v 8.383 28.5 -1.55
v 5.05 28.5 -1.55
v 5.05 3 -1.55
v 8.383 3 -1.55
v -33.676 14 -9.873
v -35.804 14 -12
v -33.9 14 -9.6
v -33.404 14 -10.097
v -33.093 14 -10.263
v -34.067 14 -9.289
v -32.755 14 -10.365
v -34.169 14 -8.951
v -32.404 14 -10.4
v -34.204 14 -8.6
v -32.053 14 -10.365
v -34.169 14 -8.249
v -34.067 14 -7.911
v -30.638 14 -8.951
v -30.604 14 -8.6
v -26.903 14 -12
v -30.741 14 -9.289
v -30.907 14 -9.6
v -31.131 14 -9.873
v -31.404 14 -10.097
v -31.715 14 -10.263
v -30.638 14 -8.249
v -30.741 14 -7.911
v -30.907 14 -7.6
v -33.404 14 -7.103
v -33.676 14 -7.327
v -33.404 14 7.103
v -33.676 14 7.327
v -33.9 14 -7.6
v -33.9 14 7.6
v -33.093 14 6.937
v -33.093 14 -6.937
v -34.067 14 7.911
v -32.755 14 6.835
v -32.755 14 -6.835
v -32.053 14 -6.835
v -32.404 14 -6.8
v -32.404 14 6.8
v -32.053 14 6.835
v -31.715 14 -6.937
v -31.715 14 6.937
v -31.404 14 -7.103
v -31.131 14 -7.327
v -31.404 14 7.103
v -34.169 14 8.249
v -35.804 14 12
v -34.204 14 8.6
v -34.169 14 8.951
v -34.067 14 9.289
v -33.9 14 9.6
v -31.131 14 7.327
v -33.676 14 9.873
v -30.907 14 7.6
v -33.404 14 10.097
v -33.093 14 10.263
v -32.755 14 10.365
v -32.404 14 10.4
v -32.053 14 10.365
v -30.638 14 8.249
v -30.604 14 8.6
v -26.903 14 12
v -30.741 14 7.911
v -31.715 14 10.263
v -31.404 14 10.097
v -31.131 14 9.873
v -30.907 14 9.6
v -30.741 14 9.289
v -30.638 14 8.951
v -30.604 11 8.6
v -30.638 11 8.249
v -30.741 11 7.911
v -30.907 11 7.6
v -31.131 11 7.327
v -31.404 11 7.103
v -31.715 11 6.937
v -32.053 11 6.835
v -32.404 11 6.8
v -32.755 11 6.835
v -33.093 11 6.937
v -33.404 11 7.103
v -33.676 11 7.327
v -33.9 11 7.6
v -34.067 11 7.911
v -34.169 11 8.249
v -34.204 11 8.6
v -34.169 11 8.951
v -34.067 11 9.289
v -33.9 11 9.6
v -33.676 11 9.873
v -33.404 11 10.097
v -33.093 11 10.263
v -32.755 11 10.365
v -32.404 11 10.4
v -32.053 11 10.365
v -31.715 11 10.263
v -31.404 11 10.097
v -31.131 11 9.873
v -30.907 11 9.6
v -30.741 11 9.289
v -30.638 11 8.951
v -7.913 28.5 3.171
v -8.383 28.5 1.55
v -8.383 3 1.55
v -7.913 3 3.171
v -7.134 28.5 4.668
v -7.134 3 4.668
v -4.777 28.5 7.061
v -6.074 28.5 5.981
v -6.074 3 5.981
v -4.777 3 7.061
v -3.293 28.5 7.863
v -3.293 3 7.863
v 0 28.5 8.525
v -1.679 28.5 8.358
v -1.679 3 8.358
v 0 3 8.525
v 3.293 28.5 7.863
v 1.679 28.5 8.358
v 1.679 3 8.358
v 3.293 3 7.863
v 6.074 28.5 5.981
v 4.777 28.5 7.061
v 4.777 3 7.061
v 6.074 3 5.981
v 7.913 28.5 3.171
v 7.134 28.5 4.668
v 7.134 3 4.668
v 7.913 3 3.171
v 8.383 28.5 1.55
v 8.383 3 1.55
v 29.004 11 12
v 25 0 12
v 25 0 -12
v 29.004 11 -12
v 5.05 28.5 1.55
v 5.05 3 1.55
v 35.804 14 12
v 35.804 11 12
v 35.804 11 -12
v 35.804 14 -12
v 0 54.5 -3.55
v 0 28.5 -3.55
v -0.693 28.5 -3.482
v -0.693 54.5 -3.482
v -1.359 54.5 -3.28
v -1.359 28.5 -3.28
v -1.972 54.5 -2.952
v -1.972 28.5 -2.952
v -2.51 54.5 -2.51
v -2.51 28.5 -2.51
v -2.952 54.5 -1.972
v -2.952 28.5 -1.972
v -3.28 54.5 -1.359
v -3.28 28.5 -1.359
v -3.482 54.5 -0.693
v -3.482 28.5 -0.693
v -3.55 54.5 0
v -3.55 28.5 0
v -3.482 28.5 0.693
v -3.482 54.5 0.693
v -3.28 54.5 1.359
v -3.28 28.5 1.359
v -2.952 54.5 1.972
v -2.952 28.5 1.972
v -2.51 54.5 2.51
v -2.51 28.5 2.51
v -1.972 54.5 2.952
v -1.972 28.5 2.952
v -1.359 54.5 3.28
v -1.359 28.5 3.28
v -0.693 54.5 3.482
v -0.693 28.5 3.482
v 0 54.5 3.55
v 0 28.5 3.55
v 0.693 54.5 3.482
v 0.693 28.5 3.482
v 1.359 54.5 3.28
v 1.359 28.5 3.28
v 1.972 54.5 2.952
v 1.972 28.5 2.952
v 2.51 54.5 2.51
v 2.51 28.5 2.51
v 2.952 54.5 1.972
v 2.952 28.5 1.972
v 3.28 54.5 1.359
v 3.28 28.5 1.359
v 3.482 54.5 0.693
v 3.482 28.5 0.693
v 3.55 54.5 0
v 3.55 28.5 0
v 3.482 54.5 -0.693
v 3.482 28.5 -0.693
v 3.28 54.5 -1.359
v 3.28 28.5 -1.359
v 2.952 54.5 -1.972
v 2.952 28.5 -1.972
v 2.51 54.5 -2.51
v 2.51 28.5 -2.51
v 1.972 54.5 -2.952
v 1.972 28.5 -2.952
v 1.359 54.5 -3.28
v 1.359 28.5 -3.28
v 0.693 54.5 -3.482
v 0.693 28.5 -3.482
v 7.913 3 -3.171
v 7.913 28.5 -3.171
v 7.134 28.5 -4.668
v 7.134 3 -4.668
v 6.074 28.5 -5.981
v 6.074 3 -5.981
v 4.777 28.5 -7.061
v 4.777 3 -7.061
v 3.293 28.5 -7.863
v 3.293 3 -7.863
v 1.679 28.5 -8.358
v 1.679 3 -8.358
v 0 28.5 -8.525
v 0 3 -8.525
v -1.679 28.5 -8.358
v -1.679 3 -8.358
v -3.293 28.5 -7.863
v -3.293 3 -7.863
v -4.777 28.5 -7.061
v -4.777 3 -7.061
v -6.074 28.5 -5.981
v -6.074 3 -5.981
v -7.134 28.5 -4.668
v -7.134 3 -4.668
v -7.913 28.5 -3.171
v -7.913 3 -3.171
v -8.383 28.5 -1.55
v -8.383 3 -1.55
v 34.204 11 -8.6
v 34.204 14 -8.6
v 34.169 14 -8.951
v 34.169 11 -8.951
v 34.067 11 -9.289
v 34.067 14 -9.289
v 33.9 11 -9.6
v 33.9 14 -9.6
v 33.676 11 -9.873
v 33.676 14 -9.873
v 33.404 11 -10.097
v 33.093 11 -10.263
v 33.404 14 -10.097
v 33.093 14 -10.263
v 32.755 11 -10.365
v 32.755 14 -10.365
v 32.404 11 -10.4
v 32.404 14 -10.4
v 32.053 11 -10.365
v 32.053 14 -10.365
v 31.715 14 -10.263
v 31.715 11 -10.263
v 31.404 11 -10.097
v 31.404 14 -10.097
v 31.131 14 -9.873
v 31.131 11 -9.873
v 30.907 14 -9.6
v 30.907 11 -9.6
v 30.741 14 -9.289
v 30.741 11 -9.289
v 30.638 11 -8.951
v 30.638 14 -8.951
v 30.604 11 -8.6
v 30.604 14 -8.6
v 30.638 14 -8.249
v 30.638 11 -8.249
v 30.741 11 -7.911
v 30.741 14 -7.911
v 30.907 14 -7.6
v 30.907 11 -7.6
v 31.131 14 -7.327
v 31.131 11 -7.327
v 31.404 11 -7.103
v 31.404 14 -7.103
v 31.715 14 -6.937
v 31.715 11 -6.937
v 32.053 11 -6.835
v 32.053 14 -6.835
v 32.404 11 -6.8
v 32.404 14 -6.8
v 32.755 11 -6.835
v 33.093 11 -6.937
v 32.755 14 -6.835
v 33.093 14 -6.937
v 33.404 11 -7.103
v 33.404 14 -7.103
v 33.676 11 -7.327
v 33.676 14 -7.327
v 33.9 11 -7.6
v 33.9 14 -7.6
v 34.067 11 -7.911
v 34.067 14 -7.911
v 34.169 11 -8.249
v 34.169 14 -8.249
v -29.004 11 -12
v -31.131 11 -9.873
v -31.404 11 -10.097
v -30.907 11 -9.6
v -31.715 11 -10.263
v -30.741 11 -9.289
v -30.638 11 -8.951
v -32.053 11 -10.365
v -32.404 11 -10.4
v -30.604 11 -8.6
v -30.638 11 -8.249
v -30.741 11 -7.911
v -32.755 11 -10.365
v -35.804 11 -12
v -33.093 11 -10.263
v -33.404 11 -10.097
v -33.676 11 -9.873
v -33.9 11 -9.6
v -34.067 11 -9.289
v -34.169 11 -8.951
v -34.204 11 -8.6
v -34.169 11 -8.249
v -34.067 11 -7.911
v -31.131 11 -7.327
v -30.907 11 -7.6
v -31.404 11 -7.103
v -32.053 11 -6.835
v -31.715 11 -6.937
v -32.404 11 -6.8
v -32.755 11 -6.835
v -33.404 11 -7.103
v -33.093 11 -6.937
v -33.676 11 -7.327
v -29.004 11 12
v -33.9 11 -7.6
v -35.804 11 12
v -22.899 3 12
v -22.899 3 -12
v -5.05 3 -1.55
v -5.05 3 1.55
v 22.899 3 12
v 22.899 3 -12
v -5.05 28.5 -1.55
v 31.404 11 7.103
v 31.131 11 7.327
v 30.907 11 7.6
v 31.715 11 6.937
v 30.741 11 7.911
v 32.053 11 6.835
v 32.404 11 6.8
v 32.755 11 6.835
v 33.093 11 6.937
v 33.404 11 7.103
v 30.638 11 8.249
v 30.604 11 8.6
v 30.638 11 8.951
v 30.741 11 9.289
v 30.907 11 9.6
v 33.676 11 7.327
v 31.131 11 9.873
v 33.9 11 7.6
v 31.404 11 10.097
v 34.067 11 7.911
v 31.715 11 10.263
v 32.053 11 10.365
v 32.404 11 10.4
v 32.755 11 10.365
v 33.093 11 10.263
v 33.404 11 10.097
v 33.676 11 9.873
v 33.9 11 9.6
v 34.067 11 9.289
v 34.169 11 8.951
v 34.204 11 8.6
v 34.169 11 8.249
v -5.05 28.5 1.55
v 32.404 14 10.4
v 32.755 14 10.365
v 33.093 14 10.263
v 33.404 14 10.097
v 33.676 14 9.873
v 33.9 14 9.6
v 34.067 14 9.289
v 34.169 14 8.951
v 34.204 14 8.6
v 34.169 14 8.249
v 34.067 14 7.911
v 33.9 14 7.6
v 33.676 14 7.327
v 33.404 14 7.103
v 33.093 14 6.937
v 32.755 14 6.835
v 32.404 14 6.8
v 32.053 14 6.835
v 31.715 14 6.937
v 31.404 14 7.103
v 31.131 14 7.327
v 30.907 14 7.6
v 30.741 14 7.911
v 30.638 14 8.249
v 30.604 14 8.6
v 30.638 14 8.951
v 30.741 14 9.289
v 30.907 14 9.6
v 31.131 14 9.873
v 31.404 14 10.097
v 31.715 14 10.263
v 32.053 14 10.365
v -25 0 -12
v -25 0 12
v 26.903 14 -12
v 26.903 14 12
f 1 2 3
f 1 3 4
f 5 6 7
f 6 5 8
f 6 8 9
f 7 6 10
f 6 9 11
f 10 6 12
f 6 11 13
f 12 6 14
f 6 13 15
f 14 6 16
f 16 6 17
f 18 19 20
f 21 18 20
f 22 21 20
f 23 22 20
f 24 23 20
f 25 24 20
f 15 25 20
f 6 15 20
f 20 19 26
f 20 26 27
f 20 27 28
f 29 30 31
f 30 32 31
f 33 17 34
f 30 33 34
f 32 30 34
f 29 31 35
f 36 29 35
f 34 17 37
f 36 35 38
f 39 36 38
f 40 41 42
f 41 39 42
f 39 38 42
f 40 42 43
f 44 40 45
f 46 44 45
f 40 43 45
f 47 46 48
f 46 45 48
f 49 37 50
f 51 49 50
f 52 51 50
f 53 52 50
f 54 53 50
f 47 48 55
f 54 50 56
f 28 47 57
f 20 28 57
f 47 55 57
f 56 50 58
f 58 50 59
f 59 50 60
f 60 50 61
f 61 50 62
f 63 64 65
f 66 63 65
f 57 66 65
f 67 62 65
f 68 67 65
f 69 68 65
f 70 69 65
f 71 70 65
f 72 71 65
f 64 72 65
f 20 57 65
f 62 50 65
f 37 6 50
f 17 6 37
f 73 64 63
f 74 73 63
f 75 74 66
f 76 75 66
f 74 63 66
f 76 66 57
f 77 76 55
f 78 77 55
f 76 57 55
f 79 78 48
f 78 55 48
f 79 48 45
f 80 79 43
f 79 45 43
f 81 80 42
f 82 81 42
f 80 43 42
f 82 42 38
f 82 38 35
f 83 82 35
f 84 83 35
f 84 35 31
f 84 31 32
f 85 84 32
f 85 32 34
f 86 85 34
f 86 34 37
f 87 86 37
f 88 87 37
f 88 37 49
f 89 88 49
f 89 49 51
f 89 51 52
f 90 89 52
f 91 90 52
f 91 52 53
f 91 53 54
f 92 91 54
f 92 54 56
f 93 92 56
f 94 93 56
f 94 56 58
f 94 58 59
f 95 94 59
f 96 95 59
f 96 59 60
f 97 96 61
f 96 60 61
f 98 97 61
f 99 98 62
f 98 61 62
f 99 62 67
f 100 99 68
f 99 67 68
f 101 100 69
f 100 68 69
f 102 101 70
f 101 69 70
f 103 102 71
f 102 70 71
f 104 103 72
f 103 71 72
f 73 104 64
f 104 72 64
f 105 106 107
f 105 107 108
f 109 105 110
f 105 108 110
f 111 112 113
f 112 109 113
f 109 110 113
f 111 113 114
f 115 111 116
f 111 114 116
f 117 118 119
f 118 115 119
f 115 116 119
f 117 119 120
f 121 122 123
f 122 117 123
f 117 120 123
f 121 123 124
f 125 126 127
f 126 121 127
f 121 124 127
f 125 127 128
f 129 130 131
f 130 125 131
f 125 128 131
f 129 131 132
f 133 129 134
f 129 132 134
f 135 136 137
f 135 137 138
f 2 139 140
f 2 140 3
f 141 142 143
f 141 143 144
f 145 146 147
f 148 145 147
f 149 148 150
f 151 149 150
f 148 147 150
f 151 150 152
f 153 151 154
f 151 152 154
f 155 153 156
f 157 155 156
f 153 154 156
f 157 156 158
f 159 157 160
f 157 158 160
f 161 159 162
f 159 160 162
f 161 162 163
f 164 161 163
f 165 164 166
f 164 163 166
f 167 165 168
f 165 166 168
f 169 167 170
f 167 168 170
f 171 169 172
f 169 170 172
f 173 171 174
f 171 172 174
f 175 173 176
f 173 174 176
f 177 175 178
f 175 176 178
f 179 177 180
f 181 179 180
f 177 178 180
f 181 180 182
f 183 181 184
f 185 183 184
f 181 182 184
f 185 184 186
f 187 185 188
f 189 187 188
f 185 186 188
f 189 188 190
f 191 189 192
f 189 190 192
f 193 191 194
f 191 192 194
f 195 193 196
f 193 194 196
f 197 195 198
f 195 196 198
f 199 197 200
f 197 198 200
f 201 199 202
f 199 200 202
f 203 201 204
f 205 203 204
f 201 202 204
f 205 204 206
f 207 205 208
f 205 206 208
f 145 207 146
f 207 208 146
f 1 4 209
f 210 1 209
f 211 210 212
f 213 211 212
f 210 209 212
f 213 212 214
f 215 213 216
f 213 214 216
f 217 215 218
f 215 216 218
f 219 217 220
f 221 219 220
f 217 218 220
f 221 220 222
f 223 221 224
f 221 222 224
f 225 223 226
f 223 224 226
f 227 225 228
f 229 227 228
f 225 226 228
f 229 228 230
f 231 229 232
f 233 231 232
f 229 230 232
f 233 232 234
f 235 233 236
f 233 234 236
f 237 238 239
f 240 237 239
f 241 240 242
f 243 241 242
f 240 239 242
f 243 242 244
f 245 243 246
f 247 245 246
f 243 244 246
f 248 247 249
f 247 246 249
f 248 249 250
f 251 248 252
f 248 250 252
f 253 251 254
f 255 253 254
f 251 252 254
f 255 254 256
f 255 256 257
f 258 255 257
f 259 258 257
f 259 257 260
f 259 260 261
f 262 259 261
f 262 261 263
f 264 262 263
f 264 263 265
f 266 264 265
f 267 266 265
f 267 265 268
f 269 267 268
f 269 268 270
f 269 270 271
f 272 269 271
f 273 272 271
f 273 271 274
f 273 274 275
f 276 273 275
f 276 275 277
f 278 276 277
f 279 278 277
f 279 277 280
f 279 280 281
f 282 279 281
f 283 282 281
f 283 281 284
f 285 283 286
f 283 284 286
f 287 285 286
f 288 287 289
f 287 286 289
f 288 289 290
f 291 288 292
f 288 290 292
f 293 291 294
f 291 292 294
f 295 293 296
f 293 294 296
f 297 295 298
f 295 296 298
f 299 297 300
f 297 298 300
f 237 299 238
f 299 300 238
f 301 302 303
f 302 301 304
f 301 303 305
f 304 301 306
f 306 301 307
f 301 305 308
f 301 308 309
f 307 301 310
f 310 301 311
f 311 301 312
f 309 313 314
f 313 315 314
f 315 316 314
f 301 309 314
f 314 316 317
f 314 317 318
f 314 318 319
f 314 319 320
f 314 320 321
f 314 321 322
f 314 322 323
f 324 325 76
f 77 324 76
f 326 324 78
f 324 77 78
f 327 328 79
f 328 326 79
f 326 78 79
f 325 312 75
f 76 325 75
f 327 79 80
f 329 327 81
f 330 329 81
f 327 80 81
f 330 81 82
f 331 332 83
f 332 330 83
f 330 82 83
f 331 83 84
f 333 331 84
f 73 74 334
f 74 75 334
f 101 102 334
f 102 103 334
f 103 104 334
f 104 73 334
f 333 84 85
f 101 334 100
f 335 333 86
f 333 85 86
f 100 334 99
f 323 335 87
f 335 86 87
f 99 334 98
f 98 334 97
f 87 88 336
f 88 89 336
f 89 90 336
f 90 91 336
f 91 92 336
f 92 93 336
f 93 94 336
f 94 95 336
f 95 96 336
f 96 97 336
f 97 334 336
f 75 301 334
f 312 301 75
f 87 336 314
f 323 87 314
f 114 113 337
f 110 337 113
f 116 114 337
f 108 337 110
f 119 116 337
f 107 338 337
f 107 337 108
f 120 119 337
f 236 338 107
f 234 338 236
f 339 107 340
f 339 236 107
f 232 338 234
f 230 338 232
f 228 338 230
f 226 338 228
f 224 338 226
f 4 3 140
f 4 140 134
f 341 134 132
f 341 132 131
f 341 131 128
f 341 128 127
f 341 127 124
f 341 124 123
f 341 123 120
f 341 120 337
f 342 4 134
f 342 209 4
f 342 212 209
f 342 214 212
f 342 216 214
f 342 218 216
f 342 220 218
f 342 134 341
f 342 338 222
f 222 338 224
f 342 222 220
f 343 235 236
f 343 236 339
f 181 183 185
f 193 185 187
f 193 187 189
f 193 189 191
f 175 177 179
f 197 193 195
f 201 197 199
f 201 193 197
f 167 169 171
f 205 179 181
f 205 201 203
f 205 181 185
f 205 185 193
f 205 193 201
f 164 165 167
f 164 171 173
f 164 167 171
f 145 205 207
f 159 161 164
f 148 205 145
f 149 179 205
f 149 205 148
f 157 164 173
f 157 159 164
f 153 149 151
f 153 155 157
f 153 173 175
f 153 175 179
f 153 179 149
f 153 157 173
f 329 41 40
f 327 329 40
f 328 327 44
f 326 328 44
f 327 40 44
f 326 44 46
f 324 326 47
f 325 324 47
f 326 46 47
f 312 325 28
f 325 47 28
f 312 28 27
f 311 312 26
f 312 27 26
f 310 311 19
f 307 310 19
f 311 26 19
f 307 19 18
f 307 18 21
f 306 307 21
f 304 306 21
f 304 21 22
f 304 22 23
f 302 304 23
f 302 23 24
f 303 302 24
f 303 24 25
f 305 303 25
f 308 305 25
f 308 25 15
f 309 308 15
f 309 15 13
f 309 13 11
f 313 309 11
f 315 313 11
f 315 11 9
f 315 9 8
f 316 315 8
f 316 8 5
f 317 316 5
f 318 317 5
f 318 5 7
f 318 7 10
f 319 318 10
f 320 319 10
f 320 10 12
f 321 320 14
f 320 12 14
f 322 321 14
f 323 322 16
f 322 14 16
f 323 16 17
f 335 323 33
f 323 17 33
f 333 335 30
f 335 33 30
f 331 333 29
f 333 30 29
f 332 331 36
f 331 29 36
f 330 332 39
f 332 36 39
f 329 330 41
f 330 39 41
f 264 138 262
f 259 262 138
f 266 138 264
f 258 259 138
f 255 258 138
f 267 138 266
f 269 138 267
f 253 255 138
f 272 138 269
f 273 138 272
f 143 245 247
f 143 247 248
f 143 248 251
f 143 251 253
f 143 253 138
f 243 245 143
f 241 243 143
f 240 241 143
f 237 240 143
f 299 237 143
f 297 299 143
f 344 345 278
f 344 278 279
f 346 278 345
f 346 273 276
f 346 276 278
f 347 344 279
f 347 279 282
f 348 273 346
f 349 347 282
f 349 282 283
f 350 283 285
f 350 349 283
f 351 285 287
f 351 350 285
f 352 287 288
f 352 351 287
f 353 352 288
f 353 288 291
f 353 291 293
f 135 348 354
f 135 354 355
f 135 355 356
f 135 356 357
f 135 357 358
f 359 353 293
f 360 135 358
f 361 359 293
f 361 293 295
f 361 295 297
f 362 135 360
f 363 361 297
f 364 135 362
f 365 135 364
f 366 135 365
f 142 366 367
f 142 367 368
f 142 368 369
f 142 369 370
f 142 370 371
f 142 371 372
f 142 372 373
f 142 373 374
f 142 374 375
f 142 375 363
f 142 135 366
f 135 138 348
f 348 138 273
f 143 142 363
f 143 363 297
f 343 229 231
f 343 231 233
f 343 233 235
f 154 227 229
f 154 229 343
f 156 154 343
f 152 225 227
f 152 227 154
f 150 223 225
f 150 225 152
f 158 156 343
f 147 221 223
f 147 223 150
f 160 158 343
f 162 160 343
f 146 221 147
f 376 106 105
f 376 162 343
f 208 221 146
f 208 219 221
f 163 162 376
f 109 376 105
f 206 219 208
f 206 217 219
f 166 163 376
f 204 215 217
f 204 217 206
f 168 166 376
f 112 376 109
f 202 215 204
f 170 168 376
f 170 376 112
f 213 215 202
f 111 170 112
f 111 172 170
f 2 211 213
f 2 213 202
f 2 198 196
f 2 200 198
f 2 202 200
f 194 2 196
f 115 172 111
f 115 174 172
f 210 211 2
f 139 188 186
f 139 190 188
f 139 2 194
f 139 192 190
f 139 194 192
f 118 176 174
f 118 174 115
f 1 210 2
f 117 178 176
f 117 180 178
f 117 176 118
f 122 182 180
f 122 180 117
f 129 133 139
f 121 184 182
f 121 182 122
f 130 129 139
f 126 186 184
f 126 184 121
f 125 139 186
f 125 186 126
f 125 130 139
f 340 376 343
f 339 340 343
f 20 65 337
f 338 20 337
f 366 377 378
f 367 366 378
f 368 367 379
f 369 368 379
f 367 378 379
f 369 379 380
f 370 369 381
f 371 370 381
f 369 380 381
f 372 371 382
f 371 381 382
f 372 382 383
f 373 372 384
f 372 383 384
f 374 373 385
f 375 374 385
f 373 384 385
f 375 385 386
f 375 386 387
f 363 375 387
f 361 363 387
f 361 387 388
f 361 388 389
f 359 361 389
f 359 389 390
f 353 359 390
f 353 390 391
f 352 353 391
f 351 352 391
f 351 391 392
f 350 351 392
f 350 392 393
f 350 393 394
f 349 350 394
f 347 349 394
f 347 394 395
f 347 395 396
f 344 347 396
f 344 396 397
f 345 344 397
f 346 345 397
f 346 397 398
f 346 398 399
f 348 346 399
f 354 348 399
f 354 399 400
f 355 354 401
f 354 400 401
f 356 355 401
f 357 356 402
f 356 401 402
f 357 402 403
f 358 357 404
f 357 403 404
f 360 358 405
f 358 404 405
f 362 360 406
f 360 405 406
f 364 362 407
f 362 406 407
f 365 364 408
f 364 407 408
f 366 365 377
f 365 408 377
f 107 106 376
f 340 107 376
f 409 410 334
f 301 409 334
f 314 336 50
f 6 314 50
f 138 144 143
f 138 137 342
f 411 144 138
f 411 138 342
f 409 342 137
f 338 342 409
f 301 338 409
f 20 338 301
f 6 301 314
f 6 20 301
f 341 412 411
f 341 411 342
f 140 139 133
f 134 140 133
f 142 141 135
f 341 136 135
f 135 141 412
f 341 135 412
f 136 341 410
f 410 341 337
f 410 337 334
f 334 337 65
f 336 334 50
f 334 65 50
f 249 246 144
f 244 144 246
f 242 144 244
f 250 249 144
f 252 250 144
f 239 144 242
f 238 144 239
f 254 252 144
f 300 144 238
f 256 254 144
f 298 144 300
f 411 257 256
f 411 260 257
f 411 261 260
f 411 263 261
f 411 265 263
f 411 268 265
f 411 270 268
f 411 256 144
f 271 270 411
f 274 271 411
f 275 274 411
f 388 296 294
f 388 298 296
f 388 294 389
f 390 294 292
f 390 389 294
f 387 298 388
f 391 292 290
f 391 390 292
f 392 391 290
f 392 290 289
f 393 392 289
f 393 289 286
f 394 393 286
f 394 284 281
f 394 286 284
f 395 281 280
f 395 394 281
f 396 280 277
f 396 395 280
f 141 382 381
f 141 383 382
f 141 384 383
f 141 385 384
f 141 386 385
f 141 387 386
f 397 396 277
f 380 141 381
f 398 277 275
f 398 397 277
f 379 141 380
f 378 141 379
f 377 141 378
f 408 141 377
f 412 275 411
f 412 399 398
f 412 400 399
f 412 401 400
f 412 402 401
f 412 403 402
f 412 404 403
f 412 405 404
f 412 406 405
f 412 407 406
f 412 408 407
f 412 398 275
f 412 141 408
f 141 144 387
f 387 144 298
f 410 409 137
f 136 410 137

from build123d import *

# Parameters (mm, degrees)
SKETCH1_W           = 50
SKETCH1_H           = 24
BOSS_EXTRUDE1_DEPTH = 3
BOSS_EXTRUDE2_DEPTH = 24
SKETCH3_R           = 8.525
BOSS_EXTRUDE3_DEPTH = 25.5
SKETCH4_R           = 3.55
BOSS_EXTRUDE4_DEPTH = 26
SKETCH5_W           = 4
SKETCH5_H           = 3.1
CUT_EXTRUDE1_DEPTH  = 25.5
CUT_EXTRUDE2_REACH  = 57.373
SKETCH6_R           = 1.8


with BuildPart() as part:
    # Sketch1 → Boss-Extrude1 (new body)
    with BuildSketch(Plane(origin=(0, 0, 0), x_dir=(1, 0, 0), z_dir=(0, 1, 0))):
        Rectangle(SKETCH1_W, SKETCH1_H)
    extrude(amount=BOSS_EXTRUDE1_DEPTH)

    # Sketch2 → Boss-Extrude2 (add)
    with BuildSketch(Plane.XY.offset(12)):
        Polygon((-25, 0), (-29.003672577, 11), (-35.803672577, 11), (-35.803672577, 14), (-26.903049962, 14), (-22.899377385, 3), align=None)
        Polygon((25, 0), (29.003672577, 11), (35.803672577, 11), (35.803672577, 14), (26.903049962, 14), (22.899377385, 3), align=None)
    extrude(amount=-BOSS_EXTRUDE2_DEPTH)

    # Sketch3 → Boss-Extrude3 (add)
    with BuildSketch(Plane(origin=(0, 3, 0), x_dir=(1, 0, 0), z_dir=(0, 1, 0))):
        with Locations(Location((0, 0, 0), (0, 0, 270))):
            Circle(SKETCH3_R)
    extrude(amount=BOSS_EXTRUDE3_DEPTH)

    # Sketch4 → Boss-Extrude4 (add)
    with BuildSketch(Plane(origin=(0, 28.5, 0), x_dir=(1, 0, 0), z_dir=(0, 1, 0))):
        with Locations(Location((0, 0, 0), (0, 0, 90))):
            Circle(SKETCH4_R)
    extrude(amount=BOSS_EXTRUDE4_DEPTH)

    # Sketch5 → Cut-Extrude1 (cut)
    with BuildSketch(Plane(origin=(0, 28.5, 0), x_dir=(1, 0, 0), z_dir=(0, 1, 0))):
        with Locations((-7.05, 0)):
            Rectangle(SKETCH5_W, SKETCH5_H)
        with Locations((7.05, 0)):
            Rectangle(SKETCH5_W, SKETCH5_H)
    extrude(amount=-CUT_EXTRUDE1_DEPTH, mode=Mode.SUBTRACT)

    # Sketch6 → Cut-Extrude2 (cut, up to next)
    with BuildSketch(Plane(origin=(0, 14, 0), x_dir=(1, 0, 0), z_dir=(0, 1, 0)), mode=Mode.PRIVATE) as cut_extrude2_sk1:
        with Locations(Location((-32.403672577, 8.6, 0), (0, 0, 270))):
            Circle(SKETCH6_R)
    cut_extrude2_tool1 = extrude(cut_extrude2_sk1.sketch, amount=-CUT_EXTRUDE2_REACH, mode=Mode.PRIVATE) & part.part
    # Sketch6 → Cut-Extrude2 (cut, up to next)
    with BuildSketch(Plane(origin=(0, 14, 0), x_dir=(1, 0, 0), z_dir=(0, 1, 0)), mode=Mode.PRIVATE) as cut_extrude2_sk2:
        with Locations((-32.403672577, -8.6)):
            Circle(SKETCH6_R)
    cut_extrude2_tool2 = extrude(cut_extrude2_sk2.sketch, amount=-CUT_EXTRUDE2_REACH, mode=Mode.PRIVATE) & part.part
    # Sketch6 → Cut-Extrude2 (cut, up to next)
    with BuildSketch(Plane(origin=(0, 14, 0), x_dir=(1, 0, 0), z_dir=(0, 1, 0)), mode=Mode.PRIVATE) as cut_extrude2_sk3:
        with Locations(Location((32.403672577, -8.6, 0), (0, 0, 270))):
            Circle(SKETCH6_R)
    cut_extrude2_tool3 = extrude(cut_extrude2_sk3.sketch, amount=-CUT_EXTRUDE2_REACH, mode=Mode.PRIVATE) & part.part
    # Sketch6 → Cut-Extrude2 (cut, up to next)
    with BuildSketch(Plane(origin=(0, 14, 0), x_dir=(1, 0, 0), z_dir=(0, 1, 0)), mode=Mode.PRIVATE) as cut_extrude2_sk4:
        with Locations((32.403672577, 8.6)):
            Circle(SKETCH6_R)
    cut_extrude2_tool4 = extrude(cut_extrude2_sk4.sketch, amount=-CUT_EXTRUDE2_REACH, mode=Mode.PRIVATE) & part.part
    add(cut_extrude2_tool1.solids().sort_by_distance((-32.403673, 14, -8.6))[0], mode=Mode.SUBTRACT)
    add(cut_extrude2_tool2.solids().sort_by_distance((-32.403673, 14, 8.6))[0], mode=Mode.SUBTRACT)
    add(cut_extrude2_tool3.solids().sort_by_distance((32.403673, 14, 8.6))[0], mode=Mode.SUBTRACT)
    add(cut_extrude2_tool4.solids().sort_by_distance((32.403673, 14, -8.6))[0], mode=Mode.SUBTRACT)


solid = part.part
